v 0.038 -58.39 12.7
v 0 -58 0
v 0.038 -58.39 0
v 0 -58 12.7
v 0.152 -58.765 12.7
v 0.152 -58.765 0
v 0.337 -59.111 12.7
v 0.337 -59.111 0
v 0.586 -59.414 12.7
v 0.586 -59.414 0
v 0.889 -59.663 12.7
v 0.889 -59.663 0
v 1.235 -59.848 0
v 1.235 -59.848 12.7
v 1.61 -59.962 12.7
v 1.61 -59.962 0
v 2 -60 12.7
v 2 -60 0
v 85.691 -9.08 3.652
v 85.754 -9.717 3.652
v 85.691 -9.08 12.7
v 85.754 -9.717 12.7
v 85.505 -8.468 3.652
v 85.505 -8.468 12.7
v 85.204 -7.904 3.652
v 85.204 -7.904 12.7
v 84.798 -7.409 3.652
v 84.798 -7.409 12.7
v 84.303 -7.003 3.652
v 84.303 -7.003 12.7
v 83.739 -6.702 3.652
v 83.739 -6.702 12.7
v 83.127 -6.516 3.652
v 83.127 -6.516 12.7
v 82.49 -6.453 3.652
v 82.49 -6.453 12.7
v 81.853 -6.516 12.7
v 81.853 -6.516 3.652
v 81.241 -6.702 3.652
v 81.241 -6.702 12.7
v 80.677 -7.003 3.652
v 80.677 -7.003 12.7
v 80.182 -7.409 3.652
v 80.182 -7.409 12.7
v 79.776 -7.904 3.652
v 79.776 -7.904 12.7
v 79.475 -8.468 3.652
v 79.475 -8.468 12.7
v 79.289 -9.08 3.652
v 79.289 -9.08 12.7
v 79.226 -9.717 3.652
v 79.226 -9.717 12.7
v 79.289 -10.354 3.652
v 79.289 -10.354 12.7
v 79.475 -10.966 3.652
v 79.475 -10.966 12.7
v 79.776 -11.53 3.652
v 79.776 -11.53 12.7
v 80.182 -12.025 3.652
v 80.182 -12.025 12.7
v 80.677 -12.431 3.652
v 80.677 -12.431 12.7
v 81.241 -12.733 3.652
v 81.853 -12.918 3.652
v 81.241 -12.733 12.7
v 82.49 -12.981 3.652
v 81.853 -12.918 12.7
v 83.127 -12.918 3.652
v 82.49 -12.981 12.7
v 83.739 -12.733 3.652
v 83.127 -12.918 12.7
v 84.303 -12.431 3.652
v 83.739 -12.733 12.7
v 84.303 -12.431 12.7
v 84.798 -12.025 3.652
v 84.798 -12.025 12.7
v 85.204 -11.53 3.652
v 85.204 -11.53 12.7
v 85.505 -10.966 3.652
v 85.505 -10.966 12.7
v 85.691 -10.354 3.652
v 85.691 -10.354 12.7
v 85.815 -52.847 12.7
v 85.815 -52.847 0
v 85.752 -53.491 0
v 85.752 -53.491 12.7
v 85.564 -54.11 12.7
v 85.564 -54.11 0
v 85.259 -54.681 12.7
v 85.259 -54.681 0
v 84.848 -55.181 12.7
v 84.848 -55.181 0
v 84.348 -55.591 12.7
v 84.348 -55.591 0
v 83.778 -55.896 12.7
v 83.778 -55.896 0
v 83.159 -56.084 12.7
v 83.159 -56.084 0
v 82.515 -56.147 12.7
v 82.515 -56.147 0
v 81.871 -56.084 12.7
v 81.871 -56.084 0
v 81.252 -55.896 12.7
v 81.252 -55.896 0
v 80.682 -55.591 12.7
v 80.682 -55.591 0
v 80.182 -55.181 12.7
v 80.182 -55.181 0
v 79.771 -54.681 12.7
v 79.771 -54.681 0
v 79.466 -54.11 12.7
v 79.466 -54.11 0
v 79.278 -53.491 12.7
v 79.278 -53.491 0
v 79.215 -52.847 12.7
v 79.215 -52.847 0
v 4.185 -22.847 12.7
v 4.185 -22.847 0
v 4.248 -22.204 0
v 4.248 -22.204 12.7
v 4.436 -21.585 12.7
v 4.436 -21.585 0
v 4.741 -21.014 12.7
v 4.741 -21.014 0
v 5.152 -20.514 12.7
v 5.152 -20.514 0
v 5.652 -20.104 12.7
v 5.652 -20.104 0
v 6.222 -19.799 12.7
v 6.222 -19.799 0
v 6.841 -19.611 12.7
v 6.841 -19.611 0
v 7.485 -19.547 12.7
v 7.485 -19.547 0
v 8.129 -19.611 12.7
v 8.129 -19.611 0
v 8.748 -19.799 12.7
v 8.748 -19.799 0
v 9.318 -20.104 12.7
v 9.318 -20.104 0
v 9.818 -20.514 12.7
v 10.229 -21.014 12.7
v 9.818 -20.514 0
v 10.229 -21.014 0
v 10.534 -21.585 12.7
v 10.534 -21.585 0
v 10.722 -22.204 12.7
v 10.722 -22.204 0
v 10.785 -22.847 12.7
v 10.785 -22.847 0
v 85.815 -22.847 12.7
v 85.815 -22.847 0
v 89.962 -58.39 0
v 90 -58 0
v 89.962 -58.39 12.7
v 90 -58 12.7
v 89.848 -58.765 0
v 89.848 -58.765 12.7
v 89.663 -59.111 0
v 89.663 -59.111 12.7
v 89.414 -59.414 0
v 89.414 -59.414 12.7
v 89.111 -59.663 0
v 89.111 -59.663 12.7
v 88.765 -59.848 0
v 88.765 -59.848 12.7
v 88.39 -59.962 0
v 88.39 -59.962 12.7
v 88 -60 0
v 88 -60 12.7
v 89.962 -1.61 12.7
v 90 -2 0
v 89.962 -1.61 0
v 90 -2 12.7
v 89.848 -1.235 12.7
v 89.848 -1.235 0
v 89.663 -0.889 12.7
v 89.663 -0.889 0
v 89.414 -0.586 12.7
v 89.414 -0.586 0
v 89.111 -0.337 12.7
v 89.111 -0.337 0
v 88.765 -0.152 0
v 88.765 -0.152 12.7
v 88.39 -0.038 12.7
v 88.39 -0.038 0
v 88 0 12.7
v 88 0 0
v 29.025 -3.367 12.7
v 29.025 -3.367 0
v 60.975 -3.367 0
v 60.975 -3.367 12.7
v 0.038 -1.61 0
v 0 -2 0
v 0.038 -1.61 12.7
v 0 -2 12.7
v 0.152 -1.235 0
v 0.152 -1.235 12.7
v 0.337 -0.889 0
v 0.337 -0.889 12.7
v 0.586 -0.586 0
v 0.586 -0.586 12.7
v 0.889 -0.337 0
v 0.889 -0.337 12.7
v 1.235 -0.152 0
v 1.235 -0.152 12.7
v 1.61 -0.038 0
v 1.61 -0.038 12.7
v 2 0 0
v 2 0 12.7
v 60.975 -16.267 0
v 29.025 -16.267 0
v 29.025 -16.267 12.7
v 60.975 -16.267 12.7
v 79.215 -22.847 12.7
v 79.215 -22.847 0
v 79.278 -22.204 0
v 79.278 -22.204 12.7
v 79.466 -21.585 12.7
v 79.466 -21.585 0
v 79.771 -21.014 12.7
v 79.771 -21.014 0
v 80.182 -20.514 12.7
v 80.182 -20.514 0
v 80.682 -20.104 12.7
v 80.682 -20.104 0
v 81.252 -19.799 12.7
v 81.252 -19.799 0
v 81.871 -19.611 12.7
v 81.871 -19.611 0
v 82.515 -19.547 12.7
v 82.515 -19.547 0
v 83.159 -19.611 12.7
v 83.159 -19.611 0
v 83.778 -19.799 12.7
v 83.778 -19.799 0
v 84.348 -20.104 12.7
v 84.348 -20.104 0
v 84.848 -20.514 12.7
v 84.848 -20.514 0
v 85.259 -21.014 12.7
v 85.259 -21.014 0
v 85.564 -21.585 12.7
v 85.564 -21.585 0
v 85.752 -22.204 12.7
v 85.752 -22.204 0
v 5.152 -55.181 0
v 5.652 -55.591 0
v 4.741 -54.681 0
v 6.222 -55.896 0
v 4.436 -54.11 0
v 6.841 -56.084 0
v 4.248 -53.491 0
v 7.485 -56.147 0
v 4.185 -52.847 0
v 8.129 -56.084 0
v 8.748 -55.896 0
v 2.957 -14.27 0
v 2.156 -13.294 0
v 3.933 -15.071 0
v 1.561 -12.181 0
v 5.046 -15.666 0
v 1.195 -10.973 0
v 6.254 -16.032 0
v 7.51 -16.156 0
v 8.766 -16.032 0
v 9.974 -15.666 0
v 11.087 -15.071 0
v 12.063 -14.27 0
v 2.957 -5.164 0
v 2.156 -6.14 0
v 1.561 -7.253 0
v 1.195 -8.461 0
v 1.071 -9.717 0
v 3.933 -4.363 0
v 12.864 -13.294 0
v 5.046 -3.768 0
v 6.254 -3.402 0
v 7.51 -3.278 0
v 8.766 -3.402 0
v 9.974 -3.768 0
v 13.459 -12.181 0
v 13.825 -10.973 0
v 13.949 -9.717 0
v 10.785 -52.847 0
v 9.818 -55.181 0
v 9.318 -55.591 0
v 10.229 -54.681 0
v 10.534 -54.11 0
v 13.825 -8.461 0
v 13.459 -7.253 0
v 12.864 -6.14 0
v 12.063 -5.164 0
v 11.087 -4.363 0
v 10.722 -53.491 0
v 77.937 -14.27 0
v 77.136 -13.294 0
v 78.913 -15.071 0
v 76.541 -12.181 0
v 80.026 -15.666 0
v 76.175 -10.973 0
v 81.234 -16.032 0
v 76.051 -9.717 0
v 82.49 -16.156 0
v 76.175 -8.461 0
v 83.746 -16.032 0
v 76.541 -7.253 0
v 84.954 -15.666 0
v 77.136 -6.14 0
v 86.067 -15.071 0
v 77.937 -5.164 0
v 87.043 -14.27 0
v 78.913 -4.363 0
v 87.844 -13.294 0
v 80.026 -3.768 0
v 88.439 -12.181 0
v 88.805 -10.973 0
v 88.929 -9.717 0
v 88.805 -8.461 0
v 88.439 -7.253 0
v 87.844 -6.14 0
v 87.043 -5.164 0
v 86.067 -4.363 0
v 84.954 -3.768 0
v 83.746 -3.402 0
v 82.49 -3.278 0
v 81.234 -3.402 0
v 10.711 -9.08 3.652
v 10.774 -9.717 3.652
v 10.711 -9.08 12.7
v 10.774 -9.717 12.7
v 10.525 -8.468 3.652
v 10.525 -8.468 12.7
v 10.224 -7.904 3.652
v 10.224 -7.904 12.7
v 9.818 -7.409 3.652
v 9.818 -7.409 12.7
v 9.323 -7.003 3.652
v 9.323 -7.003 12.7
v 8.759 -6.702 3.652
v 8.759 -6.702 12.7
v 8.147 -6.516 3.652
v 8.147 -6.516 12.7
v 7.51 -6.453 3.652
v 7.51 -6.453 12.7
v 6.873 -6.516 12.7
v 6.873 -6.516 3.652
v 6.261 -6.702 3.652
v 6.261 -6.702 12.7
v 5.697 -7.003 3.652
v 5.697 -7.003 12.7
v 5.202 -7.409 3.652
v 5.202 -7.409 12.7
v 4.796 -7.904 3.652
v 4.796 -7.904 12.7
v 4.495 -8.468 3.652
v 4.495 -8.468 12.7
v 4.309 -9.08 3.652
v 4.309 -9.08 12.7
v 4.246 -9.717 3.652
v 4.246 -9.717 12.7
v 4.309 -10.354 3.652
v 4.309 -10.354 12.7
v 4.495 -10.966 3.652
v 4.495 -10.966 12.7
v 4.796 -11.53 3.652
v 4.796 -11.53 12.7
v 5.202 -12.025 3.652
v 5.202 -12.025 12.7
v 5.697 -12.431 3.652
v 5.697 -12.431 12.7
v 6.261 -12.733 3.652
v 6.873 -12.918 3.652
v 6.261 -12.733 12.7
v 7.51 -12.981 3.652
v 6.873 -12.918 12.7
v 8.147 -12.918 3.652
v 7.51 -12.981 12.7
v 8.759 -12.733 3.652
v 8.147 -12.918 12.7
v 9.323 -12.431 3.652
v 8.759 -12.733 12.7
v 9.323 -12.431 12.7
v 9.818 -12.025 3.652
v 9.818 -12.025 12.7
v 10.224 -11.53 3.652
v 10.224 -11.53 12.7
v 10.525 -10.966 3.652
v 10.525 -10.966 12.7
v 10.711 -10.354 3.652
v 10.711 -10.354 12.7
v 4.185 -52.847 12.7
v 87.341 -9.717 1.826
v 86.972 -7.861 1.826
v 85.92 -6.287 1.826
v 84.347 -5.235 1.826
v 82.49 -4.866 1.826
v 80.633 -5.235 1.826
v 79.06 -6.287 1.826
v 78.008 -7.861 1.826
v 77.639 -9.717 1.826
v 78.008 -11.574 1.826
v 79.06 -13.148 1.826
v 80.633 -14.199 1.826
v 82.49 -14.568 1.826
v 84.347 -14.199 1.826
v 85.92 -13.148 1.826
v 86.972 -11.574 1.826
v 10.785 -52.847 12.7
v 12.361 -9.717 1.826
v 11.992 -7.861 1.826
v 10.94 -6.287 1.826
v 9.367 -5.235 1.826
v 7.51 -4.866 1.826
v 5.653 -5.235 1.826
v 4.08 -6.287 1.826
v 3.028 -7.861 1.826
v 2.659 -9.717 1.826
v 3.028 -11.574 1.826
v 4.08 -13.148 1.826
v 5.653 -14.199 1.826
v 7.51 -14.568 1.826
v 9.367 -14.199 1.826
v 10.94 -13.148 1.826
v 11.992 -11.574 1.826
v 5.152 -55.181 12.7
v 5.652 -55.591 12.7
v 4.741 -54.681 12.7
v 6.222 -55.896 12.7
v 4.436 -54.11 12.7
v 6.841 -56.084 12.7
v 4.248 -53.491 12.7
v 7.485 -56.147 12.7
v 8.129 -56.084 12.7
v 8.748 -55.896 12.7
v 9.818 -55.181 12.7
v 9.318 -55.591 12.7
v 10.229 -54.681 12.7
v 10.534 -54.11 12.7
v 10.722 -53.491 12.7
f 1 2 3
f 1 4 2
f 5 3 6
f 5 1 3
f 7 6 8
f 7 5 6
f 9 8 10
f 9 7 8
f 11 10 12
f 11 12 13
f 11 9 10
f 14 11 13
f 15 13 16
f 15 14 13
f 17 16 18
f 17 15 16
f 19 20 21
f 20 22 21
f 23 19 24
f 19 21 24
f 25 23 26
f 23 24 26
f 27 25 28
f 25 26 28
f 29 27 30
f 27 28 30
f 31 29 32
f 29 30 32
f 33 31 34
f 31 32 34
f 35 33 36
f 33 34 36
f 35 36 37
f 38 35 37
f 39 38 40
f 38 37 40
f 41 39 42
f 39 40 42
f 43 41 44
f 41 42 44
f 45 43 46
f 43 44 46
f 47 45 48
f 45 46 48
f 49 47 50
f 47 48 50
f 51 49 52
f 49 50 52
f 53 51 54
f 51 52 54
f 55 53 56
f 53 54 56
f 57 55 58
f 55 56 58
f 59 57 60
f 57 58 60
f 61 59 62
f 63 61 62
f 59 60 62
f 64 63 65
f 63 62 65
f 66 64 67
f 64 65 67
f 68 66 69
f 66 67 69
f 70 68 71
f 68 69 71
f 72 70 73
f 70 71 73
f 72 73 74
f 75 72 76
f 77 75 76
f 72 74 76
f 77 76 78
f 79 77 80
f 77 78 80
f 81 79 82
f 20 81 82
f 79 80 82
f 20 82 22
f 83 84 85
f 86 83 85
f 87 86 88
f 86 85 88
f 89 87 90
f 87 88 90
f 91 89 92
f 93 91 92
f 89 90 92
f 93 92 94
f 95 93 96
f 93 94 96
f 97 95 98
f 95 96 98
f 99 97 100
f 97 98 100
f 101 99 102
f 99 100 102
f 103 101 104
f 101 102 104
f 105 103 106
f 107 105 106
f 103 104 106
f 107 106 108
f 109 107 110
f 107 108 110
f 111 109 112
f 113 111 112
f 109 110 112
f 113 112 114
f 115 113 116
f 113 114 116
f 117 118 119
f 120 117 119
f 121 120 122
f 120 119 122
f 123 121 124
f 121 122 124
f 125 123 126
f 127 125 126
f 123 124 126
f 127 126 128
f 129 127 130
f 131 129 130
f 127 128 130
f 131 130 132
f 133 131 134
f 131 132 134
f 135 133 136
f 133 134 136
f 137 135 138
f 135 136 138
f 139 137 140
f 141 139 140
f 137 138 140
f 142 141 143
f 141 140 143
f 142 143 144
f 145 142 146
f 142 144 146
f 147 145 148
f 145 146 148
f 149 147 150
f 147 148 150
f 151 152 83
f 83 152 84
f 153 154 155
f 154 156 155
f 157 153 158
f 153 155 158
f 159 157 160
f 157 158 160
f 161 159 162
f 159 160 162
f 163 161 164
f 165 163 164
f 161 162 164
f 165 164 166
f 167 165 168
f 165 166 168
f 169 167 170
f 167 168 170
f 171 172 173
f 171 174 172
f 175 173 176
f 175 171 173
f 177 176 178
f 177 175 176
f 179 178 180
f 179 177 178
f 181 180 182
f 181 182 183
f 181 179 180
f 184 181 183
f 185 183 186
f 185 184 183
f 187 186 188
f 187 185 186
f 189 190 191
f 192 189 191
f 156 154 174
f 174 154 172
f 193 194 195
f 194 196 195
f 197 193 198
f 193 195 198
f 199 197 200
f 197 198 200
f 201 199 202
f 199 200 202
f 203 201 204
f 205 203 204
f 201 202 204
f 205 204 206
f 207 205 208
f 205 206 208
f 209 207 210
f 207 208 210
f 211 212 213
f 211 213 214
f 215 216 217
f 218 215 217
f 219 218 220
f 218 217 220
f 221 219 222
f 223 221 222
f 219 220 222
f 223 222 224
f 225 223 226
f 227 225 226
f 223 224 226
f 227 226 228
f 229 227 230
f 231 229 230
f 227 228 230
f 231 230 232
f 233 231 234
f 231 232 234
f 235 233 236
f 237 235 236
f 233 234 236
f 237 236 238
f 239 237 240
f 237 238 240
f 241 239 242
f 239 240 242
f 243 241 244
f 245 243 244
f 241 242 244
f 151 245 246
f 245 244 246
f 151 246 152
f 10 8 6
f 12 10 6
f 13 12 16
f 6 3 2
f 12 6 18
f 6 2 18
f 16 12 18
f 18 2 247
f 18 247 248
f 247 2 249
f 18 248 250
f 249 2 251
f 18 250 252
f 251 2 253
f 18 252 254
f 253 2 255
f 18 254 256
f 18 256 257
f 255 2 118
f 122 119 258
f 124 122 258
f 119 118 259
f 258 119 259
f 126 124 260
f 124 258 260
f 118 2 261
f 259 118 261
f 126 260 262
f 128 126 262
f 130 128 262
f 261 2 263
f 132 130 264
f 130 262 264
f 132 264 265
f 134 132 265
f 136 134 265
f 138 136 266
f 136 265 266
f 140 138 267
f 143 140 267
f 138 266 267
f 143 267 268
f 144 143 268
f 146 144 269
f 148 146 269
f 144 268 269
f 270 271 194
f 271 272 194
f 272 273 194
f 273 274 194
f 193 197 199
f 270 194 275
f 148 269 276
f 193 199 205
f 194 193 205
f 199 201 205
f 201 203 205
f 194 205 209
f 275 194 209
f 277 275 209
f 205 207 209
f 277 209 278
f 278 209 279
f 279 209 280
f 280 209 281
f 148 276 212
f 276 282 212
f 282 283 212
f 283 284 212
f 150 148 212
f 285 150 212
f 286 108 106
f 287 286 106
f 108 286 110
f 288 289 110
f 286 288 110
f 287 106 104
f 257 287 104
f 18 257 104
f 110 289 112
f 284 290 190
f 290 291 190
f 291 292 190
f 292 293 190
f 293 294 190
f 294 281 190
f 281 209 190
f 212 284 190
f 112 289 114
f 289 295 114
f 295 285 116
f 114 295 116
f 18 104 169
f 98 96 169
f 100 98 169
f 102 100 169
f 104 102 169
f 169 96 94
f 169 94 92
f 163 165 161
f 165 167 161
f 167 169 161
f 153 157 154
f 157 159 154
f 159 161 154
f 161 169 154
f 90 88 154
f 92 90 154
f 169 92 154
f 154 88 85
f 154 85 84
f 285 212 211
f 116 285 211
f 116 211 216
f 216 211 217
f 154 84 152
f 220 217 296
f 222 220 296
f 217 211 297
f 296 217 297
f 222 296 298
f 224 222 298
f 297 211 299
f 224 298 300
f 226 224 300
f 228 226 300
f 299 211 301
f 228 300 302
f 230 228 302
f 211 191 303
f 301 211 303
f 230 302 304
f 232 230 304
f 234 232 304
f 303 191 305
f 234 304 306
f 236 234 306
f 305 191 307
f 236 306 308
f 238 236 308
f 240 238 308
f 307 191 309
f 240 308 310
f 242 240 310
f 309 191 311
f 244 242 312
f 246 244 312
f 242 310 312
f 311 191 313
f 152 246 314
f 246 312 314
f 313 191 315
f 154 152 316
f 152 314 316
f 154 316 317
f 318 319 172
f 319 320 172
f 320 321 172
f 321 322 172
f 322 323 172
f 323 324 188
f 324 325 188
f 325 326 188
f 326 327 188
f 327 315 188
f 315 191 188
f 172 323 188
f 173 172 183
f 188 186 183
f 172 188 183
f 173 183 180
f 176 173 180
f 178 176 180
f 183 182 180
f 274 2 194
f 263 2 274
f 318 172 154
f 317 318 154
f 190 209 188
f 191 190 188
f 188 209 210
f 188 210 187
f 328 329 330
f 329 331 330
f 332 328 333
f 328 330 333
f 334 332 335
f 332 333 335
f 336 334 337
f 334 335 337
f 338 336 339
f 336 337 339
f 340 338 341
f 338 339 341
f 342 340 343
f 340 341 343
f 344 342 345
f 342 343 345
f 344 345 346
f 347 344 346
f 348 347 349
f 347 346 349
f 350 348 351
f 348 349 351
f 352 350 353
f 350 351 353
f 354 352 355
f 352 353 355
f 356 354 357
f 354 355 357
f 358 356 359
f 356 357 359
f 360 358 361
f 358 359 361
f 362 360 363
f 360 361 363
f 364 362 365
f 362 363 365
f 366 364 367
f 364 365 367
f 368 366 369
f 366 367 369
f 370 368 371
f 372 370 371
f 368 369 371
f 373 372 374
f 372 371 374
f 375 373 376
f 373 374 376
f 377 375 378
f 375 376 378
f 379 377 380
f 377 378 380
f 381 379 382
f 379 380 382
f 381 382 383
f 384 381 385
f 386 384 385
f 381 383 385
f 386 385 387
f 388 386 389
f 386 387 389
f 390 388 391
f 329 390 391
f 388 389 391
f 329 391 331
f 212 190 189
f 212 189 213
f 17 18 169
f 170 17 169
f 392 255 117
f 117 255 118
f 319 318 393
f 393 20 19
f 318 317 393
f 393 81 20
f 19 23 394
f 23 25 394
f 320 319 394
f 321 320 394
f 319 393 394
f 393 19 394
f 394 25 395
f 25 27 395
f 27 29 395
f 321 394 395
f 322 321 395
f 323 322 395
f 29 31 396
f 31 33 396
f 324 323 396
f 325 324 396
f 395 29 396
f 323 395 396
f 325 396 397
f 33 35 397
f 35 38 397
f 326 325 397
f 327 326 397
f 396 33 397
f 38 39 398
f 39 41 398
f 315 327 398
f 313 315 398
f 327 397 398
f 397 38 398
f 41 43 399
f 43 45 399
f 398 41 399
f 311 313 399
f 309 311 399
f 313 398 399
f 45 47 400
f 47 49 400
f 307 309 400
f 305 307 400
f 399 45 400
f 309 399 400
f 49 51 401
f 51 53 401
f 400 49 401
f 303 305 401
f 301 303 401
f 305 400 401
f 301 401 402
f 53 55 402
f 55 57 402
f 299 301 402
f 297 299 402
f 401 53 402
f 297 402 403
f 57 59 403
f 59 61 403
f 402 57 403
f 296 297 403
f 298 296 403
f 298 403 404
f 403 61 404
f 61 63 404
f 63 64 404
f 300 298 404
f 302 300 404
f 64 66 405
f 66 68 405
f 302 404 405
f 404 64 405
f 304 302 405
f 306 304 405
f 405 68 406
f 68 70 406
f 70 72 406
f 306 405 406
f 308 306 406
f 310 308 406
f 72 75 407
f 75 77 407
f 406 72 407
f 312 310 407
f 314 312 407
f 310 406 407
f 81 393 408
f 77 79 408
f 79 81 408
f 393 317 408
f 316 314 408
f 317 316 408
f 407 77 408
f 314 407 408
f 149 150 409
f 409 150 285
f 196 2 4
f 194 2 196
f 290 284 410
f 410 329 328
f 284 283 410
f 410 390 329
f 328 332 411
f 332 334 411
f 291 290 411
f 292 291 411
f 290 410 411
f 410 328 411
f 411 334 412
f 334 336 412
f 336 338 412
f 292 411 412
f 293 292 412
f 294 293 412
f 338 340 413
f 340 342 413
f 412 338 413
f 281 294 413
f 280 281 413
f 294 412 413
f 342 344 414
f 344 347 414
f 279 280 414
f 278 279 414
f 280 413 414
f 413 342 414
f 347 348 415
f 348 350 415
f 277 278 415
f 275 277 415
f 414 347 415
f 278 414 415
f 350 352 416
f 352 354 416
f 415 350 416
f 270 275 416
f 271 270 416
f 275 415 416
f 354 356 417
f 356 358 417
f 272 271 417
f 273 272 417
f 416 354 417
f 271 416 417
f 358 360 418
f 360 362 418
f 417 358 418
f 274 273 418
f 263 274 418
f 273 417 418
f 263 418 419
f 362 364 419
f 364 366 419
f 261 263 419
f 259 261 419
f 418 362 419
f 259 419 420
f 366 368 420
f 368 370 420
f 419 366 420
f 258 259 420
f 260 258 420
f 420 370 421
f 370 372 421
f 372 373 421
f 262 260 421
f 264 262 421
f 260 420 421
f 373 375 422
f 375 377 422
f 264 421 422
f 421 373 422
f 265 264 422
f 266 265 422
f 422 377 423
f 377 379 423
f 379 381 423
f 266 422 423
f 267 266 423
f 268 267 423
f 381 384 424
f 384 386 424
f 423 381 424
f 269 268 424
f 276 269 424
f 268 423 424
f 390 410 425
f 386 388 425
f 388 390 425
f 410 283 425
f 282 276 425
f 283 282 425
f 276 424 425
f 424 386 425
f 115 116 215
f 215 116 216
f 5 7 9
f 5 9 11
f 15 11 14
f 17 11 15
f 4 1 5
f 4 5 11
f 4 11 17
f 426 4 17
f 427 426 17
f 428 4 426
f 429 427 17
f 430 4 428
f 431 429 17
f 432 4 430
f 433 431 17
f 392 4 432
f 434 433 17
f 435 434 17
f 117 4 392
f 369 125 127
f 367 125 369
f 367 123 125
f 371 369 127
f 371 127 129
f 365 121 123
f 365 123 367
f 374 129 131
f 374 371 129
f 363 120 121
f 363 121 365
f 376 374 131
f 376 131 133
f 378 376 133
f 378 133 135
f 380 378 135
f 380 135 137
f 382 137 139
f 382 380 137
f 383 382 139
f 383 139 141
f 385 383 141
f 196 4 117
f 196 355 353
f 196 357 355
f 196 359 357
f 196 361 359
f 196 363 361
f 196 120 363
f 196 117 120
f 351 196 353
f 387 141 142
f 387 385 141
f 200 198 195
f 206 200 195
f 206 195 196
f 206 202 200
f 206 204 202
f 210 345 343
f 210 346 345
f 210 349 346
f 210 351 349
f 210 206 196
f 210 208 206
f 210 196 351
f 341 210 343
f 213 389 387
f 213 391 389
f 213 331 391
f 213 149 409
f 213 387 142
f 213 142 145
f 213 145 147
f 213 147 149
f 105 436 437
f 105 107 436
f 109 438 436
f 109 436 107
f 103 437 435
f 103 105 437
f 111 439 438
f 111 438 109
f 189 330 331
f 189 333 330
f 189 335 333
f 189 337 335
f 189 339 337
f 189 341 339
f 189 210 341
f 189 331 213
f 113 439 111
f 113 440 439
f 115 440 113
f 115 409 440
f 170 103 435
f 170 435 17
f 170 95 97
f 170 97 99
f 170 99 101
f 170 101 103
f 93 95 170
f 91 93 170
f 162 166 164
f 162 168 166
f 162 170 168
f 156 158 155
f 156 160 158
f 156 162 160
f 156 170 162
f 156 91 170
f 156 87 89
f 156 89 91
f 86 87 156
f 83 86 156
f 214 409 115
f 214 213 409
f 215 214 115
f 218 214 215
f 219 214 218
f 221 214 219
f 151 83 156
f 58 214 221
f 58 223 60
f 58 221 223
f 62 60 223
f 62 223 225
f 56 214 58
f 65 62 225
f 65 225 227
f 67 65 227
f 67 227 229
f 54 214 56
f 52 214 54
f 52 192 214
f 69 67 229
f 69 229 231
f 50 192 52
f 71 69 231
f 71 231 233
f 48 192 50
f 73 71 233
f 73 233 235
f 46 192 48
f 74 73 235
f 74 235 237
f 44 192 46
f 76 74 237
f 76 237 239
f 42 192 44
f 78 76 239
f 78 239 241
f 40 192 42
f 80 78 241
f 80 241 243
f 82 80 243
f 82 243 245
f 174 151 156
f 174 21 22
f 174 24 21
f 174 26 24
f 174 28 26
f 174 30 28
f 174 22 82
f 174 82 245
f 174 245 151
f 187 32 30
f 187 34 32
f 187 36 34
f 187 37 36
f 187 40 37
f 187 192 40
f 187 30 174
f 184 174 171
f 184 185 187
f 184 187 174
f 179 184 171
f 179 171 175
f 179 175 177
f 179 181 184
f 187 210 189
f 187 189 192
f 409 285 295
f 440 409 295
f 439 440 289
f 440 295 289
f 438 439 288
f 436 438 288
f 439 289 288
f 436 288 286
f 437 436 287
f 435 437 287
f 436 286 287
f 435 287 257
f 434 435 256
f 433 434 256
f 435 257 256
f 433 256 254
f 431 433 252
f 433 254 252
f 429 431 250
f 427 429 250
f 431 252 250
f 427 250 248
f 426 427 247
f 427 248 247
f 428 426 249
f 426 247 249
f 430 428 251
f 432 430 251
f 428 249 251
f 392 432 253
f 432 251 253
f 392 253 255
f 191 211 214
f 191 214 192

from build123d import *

# Parameters (mm, degrees)
SKETCH1_W                                        = 90
SKETCH1_H                                        = 60
BOSS_EXTRUDE1_DEPTH                              = 12.7
CSK_FOR_1_4_FLAT_HEAD_MACHINE_SCREW1_D           = 6.5278
CSK_FOR_1_4_FLAT_HEAD_MACHINE_SCREW1_CSINK_D     = 12.8778
CSK_FOR_1_4_FLAT_HEAD_MACHINE_SCREW1_CSINK_ANGLE = 82
FILLET1_R                                        = 2
CUT_EXTRUDE1_DEPTH                               = 109.909549627


with BuildPart() as part:
    # Sketch1 → Boss-Extrude1 (new body)
    with BuildSketch(Plane.XY):
        with Locations((45, -30)):
            Rectangle(SKETCH1_W, SKETCH1_H)
        Polygon((29.025, -3.367091904), (29.025, -16.267091904), (60.975, -16.267091904), (60.975, -3.367091904), (45, -3.367091904), align=None, mode=Mode.SUBTRACT)
    extrude(amount=BOSS_EXTRUDE1_DEPTH)

    # CSK for 1/4 Flat Head Machine Screw1 (through all)
    with Locations(Plane(origin=(0, 0, 0), x_dir=(-1, 0, 0), z_dir=(0, 0, -1))):
        with Locations((-82.49, -9.717091904), (-7.51, -9.717091904)):
            CounterSinkHole(CSK_FOR_1_4_FLAT_HEAD_MACHINE_SCREW1_D / 2, CSK_FOR_1_4_FLAT_HEAD_MACHINE_SCREW1_CSINK_D / 2, counter_sink_angle=CSK_FOR_1_4_FLAT_HEAD_MACHINE_SCREW1_CSINK_ANGLE)

    # Fillet1
    fillet1_edges = [part.edges().sort_by_distance(p)[0] for p in [
        (0, 0, 6.35),
        (90, 0, 6.35),
        (90, -60, 6.35),
        (0, -60, 6.35),
    ]]
    fillet(fillet1_edges, radius=FILLET1_R)

    # Sketch5 → Cut-Extrude1 (cut, through all)
    with BuildSketch(Plane(origin=(0, 0, 0), x_dir=(-1, 0, 0), z_dir=(0, 0, -1))):
        with BuildLine():
            Line((-10.785, -22.847364981), (-10.785, -52.847364981))
            ThreePointArc((-10.785, -52.847364981), (-7.485, -56.147364981), (-4.185, -52.847364981))
            Line((-4.185, -52.847364981), (-4.185, -22.847364981))
            ThreePointArc((-4.185, -22.847364981), (-7.485, -19.547364981), (-10.785, -22.847364981))
        make_face()
        with BuildLine():
            Line((-79.215, -52.847364981), (-79.215, -22.847364981))
            ThreePointArc((-79.215, -22.847364981), (-82.515, -19.547364981), (-85.815, -22.847364981))
            Line((-85.815, -22.847364981), (-85.815, -52.847364981))
            ThreePointArc((-85.815, -52.847364981), (-82.515, -56.147364981), (-79.215, -52.847364981))
        make_face()
    extrude(amount=-CUT_EXTRUDE1_DEPTH, mode=Mode.SUBTRACT)


solid = part.part
